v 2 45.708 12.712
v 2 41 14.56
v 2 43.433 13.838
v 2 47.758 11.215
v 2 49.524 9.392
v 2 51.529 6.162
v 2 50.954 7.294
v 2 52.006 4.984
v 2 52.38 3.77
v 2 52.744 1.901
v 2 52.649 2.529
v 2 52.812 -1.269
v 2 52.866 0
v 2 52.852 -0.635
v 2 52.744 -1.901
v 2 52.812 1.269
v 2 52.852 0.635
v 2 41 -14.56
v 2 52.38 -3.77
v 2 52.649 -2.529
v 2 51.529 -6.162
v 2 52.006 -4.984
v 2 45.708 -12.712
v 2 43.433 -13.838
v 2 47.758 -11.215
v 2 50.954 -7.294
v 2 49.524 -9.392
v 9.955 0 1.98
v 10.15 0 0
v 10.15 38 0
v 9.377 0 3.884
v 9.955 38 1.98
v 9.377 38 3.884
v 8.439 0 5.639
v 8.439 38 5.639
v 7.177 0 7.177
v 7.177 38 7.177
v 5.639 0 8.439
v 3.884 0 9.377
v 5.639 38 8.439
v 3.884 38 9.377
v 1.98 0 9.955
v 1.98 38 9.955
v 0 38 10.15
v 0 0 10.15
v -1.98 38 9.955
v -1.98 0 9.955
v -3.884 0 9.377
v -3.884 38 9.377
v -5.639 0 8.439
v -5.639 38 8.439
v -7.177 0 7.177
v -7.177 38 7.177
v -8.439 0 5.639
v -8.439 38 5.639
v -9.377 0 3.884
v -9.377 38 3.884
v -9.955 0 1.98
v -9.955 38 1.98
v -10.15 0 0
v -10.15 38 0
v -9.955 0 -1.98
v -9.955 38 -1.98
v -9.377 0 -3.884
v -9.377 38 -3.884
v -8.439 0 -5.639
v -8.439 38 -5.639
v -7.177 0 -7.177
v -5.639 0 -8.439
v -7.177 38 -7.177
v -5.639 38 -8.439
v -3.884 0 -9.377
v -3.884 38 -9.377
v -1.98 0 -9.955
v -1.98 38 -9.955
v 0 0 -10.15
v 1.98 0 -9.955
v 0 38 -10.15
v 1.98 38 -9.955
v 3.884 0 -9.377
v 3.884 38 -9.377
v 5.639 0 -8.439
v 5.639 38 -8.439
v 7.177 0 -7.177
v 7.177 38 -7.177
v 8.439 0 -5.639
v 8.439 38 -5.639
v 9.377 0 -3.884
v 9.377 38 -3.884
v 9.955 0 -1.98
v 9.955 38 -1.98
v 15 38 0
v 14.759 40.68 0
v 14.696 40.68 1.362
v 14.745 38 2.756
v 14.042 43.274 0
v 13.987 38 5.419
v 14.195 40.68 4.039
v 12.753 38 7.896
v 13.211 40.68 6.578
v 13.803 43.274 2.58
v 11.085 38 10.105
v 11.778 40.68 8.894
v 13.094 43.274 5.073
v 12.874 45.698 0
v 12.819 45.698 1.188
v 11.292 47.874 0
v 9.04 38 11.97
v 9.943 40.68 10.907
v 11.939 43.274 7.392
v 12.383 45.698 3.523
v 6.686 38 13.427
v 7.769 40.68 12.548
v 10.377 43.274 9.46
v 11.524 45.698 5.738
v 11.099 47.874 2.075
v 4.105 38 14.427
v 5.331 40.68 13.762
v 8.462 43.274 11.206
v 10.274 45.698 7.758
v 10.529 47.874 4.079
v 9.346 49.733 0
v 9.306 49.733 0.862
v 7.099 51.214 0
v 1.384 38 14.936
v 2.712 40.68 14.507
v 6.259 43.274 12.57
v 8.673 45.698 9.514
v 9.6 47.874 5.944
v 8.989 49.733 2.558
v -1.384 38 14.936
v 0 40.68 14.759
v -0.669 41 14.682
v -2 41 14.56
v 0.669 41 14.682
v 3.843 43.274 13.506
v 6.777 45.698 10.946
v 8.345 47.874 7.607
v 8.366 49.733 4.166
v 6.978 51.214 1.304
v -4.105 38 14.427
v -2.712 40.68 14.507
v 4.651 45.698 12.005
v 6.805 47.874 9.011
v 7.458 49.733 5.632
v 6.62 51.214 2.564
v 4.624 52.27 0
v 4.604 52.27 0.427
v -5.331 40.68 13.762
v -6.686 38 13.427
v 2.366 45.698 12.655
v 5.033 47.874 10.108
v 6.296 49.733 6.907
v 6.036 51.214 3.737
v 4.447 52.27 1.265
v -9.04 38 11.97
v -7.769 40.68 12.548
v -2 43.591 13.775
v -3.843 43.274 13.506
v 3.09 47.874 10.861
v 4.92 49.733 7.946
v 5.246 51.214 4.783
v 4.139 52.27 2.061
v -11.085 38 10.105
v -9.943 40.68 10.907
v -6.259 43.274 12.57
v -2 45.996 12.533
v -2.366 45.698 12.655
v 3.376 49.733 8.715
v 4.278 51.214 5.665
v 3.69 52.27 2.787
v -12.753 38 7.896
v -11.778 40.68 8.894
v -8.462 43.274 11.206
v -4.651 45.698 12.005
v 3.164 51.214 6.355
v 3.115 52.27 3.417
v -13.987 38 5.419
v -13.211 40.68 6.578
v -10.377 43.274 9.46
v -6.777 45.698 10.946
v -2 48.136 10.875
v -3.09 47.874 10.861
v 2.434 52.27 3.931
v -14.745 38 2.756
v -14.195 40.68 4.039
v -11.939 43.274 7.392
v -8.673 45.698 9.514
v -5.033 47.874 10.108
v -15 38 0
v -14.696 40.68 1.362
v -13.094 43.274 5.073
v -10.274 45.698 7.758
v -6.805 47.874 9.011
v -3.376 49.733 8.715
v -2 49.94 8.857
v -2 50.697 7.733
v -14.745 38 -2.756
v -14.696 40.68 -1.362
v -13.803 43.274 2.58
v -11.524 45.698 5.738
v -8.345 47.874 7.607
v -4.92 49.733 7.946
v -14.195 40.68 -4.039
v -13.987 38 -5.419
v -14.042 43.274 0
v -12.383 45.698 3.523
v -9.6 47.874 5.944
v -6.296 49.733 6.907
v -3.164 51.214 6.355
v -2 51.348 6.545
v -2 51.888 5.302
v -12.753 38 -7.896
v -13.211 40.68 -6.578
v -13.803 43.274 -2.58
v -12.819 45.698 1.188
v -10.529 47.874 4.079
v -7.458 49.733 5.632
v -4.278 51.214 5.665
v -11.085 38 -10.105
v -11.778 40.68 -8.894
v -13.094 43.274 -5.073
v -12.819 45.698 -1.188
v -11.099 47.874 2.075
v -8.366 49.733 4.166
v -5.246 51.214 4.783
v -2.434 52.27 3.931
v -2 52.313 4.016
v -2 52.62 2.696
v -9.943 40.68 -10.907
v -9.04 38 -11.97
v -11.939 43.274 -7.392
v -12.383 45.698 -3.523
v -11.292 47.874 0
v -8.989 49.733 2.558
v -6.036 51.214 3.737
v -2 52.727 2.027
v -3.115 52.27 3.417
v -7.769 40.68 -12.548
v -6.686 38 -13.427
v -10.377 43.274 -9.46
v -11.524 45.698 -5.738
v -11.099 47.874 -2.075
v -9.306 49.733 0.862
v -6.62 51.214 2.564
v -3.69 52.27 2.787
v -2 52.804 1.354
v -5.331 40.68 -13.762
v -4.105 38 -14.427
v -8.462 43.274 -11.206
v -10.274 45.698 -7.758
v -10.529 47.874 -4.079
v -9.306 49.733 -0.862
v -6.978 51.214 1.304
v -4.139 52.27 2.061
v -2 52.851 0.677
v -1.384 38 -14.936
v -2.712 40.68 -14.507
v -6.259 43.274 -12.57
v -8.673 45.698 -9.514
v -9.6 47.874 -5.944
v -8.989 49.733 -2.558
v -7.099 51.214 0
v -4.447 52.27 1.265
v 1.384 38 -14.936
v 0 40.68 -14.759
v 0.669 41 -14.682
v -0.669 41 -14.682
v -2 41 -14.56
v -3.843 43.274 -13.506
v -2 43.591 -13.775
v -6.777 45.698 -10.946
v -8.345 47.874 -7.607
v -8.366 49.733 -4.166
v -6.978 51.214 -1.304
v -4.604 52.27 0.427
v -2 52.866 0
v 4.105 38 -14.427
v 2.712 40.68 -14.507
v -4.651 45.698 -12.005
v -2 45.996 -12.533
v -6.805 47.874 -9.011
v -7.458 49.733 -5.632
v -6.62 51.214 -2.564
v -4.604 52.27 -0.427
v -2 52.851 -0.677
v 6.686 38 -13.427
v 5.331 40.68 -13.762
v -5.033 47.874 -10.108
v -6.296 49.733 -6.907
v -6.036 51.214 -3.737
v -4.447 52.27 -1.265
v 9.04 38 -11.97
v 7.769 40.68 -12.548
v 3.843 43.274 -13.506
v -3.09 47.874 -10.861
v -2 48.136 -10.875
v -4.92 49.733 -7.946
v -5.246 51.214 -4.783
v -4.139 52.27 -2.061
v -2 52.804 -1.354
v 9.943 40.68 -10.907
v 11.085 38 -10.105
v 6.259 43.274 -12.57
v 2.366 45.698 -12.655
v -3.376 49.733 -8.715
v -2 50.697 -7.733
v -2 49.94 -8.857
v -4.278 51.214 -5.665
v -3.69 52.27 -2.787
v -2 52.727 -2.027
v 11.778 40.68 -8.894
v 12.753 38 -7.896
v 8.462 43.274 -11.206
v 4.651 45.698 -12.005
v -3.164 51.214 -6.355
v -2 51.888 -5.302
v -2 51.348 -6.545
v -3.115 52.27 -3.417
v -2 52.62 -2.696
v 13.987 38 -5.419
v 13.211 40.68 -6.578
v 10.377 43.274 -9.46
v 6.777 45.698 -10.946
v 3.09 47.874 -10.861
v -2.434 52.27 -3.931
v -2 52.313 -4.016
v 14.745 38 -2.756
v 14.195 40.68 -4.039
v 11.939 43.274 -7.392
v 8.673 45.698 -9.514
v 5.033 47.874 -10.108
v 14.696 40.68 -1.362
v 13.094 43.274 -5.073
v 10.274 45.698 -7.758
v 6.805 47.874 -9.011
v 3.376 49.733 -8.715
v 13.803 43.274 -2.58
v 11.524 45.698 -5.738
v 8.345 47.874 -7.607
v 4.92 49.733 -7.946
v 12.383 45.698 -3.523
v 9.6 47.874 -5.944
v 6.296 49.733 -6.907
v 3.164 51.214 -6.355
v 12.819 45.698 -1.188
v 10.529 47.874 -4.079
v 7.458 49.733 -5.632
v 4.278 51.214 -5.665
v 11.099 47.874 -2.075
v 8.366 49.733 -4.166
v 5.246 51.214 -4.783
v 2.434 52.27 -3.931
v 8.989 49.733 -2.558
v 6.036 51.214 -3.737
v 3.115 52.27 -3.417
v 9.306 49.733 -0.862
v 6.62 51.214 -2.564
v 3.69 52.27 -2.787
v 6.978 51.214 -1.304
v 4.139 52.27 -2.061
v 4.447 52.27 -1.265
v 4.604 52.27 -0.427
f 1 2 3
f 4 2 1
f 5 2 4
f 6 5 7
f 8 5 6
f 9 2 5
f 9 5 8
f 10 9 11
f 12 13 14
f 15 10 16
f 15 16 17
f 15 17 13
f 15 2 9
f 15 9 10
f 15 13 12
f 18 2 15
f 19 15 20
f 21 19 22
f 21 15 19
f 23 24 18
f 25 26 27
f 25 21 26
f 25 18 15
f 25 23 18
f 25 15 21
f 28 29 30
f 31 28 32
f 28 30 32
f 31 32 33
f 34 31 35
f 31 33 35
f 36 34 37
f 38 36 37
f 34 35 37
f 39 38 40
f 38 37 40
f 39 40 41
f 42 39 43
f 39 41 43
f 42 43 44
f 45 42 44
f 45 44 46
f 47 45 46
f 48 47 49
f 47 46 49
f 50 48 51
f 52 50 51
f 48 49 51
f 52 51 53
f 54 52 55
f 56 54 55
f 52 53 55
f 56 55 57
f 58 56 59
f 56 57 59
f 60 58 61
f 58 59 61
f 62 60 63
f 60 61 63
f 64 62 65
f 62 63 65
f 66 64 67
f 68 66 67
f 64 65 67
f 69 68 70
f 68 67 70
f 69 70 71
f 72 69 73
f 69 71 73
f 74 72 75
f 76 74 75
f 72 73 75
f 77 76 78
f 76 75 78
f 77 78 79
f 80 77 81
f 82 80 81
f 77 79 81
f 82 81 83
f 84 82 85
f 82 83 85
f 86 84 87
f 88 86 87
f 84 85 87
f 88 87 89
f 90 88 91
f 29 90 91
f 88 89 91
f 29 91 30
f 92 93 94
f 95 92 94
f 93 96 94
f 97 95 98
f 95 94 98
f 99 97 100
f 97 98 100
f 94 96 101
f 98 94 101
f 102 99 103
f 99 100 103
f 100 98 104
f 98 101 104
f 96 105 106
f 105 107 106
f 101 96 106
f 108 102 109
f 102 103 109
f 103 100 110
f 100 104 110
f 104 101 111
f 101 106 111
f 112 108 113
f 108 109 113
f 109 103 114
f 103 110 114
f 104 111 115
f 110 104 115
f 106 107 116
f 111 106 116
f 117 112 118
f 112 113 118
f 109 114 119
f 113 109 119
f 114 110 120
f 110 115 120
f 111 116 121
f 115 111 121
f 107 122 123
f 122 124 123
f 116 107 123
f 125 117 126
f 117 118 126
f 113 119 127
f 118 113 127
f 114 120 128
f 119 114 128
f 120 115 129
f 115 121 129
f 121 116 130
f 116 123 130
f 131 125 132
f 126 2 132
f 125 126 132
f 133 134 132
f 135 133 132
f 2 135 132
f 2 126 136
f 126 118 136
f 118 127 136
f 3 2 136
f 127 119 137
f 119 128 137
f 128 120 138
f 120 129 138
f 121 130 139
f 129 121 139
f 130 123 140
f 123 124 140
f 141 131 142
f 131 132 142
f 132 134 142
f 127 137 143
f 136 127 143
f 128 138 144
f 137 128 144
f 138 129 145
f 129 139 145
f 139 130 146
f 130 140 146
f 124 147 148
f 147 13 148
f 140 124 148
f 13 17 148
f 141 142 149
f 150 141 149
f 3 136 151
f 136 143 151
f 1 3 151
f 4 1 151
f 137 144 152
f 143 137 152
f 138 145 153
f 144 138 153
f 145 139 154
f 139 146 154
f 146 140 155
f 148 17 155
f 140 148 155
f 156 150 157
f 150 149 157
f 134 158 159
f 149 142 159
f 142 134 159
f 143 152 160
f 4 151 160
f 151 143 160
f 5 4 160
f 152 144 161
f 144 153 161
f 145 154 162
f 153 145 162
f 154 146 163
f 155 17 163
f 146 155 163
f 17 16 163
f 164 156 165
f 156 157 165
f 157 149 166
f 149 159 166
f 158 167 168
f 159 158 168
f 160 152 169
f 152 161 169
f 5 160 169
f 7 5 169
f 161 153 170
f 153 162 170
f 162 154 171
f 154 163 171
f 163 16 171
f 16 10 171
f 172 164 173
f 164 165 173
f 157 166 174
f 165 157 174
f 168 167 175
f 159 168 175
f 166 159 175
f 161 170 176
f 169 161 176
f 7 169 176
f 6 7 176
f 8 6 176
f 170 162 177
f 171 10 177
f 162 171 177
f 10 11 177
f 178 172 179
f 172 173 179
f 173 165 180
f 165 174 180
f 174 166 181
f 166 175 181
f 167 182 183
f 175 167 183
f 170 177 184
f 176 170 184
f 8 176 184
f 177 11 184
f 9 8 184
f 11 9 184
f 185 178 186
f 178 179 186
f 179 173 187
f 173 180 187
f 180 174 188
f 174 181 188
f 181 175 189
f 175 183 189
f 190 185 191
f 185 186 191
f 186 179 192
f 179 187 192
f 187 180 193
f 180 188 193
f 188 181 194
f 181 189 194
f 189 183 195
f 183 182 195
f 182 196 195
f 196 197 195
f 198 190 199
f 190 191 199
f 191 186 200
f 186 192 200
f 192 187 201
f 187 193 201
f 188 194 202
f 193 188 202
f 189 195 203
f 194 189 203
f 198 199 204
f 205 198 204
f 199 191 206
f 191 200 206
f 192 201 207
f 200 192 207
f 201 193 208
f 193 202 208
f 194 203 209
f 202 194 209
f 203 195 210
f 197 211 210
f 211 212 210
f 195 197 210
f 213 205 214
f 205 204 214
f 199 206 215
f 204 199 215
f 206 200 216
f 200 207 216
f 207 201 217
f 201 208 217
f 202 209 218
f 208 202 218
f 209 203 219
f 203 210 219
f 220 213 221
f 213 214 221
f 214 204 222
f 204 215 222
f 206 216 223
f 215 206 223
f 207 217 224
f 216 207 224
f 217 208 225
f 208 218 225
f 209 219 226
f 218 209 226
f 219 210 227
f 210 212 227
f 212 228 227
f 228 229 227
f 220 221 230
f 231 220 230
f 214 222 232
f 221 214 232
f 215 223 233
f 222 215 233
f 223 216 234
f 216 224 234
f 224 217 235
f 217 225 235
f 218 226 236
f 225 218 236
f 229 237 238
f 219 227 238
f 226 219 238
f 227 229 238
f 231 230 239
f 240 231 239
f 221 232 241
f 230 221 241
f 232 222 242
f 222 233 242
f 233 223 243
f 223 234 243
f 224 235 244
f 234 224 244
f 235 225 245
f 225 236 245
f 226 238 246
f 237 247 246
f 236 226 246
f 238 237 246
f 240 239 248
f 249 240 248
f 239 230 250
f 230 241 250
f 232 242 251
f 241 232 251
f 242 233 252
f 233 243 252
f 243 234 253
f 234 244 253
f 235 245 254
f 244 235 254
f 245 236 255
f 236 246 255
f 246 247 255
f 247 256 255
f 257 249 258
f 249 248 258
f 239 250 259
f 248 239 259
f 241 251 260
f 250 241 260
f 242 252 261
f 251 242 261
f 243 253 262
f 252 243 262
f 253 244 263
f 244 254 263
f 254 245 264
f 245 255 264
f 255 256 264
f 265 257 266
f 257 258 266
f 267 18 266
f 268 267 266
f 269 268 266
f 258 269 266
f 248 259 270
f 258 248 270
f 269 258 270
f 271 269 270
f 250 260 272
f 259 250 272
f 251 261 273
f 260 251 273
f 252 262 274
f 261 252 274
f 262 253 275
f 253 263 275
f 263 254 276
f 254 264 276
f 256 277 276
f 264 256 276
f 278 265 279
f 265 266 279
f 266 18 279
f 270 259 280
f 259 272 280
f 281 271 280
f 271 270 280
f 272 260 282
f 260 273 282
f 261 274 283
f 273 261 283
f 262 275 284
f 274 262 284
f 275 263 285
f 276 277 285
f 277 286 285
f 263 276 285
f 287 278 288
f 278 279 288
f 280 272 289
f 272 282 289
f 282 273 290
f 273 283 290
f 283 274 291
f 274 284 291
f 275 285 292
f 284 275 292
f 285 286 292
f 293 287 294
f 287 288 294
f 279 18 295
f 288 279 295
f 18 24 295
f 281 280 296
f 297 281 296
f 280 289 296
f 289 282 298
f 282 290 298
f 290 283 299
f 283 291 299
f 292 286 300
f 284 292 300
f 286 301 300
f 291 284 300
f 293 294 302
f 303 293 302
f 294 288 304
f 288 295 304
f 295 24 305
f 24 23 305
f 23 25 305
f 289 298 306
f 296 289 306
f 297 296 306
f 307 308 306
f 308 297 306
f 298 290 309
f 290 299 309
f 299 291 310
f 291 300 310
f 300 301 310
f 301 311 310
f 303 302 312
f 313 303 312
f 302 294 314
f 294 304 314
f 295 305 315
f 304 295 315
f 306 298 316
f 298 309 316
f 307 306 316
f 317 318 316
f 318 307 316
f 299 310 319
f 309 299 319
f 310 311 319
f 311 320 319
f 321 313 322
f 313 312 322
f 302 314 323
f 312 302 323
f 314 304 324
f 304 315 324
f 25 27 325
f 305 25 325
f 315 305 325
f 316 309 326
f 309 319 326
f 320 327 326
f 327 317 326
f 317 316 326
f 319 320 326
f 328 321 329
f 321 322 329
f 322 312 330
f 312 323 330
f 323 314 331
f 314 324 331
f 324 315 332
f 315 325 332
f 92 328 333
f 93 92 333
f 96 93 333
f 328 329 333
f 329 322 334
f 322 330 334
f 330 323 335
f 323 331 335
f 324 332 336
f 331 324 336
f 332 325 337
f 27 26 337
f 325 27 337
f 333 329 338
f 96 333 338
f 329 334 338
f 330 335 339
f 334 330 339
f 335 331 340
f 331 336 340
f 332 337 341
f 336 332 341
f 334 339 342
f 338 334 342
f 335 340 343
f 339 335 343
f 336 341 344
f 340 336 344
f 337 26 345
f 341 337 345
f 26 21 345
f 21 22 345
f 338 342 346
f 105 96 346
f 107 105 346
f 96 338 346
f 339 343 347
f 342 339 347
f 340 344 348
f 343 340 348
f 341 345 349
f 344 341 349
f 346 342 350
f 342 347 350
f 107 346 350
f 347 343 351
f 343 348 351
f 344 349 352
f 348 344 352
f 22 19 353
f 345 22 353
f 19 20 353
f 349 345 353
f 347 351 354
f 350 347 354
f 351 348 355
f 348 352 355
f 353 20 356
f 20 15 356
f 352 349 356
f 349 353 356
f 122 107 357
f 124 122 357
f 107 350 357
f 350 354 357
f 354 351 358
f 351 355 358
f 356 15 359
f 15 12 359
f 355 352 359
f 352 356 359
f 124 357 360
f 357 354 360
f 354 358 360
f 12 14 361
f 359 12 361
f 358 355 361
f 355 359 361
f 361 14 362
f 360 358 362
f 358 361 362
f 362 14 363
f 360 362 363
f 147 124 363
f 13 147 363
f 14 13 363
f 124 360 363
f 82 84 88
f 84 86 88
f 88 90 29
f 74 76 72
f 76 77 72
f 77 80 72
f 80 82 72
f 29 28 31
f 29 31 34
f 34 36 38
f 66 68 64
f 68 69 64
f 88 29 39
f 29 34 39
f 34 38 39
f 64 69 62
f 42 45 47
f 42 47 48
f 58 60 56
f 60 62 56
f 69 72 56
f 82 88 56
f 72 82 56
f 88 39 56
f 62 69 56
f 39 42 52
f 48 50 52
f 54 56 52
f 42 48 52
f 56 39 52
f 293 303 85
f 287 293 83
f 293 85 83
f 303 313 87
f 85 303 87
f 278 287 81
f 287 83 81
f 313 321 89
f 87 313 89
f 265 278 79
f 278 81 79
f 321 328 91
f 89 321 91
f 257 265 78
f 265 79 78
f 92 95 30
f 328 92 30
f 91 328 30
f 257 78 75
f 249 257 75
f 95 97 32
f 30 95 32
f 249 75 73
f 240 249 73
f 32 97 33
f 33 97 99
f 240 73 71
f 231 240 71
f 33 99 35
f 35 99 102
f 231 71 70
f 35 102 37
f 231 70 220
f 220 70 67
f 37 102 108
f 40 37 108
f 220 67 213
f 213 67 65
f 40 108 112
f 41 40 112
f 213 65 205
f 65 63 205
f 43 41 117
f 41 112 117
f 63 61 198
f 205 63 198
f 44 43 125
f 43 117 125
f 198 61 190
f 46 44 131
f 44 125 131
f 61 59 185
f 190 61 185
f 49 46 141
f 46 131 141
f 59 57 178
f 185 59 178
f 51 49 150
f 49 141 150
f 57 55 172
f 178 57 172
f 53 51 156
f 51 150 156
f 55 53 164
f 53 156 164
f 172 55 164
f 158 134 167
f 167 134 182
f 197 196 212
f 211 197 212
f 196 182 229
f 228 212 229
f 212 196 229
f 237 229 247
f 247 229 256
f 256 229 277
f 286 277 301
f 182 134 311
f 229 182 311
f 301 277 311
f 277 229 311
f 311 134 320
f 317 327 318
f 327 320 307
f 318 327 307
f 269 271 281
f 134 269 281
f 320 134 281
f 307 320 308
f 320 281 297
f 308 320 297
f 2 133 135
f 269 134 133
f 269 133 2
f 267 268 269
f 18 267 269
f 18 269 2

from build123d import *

# Parameters (mm, degrees)
SKETCH2_W               = 4
SKETCH2_H               = 20.325154634
CUT_EXTRUDE1_DEPTH      = 16
CUT_EXTRUDE1_DEPTH_BACK = 16


with BuildPart() as part:
    # Sketch1 → Revolve1 (revolve)
    with BuildSketch(Plane.XY):
        with BuildLine():
            Line((0, 53), (0, 0))
            Line((0, 0), (10.15, 0))
            Line((10.15, 0), (10.15, 38))
            Line((10.15, 38), (15, 38))
            ThreePointArc((15, 38), (10.606601718, 48.606601718), (0, 53))
        make_face()
    revolve(axis=Axis((0, 53, 0), (0, -1, 0)))

    # Sketch2 → Cut-Extrude1 (cut, two sides)
    with BuildSketch(Plane.XY) as cut_extrude1_sk:
        with Locations((0, 51.162577317)):
            Rectangle(SKETCH2_W, SKETCH2_H)
    extrude(amount=CUT_EXTRUDE1_DEPTH, mode=Mode.SUBTRACT)
    extrude(cut_extrude1_sk.sketch, amount=-CUT_EXTRUDE1_DEPTH_BACK, mode=Mode.SUBTRACT)


solid = part.part
